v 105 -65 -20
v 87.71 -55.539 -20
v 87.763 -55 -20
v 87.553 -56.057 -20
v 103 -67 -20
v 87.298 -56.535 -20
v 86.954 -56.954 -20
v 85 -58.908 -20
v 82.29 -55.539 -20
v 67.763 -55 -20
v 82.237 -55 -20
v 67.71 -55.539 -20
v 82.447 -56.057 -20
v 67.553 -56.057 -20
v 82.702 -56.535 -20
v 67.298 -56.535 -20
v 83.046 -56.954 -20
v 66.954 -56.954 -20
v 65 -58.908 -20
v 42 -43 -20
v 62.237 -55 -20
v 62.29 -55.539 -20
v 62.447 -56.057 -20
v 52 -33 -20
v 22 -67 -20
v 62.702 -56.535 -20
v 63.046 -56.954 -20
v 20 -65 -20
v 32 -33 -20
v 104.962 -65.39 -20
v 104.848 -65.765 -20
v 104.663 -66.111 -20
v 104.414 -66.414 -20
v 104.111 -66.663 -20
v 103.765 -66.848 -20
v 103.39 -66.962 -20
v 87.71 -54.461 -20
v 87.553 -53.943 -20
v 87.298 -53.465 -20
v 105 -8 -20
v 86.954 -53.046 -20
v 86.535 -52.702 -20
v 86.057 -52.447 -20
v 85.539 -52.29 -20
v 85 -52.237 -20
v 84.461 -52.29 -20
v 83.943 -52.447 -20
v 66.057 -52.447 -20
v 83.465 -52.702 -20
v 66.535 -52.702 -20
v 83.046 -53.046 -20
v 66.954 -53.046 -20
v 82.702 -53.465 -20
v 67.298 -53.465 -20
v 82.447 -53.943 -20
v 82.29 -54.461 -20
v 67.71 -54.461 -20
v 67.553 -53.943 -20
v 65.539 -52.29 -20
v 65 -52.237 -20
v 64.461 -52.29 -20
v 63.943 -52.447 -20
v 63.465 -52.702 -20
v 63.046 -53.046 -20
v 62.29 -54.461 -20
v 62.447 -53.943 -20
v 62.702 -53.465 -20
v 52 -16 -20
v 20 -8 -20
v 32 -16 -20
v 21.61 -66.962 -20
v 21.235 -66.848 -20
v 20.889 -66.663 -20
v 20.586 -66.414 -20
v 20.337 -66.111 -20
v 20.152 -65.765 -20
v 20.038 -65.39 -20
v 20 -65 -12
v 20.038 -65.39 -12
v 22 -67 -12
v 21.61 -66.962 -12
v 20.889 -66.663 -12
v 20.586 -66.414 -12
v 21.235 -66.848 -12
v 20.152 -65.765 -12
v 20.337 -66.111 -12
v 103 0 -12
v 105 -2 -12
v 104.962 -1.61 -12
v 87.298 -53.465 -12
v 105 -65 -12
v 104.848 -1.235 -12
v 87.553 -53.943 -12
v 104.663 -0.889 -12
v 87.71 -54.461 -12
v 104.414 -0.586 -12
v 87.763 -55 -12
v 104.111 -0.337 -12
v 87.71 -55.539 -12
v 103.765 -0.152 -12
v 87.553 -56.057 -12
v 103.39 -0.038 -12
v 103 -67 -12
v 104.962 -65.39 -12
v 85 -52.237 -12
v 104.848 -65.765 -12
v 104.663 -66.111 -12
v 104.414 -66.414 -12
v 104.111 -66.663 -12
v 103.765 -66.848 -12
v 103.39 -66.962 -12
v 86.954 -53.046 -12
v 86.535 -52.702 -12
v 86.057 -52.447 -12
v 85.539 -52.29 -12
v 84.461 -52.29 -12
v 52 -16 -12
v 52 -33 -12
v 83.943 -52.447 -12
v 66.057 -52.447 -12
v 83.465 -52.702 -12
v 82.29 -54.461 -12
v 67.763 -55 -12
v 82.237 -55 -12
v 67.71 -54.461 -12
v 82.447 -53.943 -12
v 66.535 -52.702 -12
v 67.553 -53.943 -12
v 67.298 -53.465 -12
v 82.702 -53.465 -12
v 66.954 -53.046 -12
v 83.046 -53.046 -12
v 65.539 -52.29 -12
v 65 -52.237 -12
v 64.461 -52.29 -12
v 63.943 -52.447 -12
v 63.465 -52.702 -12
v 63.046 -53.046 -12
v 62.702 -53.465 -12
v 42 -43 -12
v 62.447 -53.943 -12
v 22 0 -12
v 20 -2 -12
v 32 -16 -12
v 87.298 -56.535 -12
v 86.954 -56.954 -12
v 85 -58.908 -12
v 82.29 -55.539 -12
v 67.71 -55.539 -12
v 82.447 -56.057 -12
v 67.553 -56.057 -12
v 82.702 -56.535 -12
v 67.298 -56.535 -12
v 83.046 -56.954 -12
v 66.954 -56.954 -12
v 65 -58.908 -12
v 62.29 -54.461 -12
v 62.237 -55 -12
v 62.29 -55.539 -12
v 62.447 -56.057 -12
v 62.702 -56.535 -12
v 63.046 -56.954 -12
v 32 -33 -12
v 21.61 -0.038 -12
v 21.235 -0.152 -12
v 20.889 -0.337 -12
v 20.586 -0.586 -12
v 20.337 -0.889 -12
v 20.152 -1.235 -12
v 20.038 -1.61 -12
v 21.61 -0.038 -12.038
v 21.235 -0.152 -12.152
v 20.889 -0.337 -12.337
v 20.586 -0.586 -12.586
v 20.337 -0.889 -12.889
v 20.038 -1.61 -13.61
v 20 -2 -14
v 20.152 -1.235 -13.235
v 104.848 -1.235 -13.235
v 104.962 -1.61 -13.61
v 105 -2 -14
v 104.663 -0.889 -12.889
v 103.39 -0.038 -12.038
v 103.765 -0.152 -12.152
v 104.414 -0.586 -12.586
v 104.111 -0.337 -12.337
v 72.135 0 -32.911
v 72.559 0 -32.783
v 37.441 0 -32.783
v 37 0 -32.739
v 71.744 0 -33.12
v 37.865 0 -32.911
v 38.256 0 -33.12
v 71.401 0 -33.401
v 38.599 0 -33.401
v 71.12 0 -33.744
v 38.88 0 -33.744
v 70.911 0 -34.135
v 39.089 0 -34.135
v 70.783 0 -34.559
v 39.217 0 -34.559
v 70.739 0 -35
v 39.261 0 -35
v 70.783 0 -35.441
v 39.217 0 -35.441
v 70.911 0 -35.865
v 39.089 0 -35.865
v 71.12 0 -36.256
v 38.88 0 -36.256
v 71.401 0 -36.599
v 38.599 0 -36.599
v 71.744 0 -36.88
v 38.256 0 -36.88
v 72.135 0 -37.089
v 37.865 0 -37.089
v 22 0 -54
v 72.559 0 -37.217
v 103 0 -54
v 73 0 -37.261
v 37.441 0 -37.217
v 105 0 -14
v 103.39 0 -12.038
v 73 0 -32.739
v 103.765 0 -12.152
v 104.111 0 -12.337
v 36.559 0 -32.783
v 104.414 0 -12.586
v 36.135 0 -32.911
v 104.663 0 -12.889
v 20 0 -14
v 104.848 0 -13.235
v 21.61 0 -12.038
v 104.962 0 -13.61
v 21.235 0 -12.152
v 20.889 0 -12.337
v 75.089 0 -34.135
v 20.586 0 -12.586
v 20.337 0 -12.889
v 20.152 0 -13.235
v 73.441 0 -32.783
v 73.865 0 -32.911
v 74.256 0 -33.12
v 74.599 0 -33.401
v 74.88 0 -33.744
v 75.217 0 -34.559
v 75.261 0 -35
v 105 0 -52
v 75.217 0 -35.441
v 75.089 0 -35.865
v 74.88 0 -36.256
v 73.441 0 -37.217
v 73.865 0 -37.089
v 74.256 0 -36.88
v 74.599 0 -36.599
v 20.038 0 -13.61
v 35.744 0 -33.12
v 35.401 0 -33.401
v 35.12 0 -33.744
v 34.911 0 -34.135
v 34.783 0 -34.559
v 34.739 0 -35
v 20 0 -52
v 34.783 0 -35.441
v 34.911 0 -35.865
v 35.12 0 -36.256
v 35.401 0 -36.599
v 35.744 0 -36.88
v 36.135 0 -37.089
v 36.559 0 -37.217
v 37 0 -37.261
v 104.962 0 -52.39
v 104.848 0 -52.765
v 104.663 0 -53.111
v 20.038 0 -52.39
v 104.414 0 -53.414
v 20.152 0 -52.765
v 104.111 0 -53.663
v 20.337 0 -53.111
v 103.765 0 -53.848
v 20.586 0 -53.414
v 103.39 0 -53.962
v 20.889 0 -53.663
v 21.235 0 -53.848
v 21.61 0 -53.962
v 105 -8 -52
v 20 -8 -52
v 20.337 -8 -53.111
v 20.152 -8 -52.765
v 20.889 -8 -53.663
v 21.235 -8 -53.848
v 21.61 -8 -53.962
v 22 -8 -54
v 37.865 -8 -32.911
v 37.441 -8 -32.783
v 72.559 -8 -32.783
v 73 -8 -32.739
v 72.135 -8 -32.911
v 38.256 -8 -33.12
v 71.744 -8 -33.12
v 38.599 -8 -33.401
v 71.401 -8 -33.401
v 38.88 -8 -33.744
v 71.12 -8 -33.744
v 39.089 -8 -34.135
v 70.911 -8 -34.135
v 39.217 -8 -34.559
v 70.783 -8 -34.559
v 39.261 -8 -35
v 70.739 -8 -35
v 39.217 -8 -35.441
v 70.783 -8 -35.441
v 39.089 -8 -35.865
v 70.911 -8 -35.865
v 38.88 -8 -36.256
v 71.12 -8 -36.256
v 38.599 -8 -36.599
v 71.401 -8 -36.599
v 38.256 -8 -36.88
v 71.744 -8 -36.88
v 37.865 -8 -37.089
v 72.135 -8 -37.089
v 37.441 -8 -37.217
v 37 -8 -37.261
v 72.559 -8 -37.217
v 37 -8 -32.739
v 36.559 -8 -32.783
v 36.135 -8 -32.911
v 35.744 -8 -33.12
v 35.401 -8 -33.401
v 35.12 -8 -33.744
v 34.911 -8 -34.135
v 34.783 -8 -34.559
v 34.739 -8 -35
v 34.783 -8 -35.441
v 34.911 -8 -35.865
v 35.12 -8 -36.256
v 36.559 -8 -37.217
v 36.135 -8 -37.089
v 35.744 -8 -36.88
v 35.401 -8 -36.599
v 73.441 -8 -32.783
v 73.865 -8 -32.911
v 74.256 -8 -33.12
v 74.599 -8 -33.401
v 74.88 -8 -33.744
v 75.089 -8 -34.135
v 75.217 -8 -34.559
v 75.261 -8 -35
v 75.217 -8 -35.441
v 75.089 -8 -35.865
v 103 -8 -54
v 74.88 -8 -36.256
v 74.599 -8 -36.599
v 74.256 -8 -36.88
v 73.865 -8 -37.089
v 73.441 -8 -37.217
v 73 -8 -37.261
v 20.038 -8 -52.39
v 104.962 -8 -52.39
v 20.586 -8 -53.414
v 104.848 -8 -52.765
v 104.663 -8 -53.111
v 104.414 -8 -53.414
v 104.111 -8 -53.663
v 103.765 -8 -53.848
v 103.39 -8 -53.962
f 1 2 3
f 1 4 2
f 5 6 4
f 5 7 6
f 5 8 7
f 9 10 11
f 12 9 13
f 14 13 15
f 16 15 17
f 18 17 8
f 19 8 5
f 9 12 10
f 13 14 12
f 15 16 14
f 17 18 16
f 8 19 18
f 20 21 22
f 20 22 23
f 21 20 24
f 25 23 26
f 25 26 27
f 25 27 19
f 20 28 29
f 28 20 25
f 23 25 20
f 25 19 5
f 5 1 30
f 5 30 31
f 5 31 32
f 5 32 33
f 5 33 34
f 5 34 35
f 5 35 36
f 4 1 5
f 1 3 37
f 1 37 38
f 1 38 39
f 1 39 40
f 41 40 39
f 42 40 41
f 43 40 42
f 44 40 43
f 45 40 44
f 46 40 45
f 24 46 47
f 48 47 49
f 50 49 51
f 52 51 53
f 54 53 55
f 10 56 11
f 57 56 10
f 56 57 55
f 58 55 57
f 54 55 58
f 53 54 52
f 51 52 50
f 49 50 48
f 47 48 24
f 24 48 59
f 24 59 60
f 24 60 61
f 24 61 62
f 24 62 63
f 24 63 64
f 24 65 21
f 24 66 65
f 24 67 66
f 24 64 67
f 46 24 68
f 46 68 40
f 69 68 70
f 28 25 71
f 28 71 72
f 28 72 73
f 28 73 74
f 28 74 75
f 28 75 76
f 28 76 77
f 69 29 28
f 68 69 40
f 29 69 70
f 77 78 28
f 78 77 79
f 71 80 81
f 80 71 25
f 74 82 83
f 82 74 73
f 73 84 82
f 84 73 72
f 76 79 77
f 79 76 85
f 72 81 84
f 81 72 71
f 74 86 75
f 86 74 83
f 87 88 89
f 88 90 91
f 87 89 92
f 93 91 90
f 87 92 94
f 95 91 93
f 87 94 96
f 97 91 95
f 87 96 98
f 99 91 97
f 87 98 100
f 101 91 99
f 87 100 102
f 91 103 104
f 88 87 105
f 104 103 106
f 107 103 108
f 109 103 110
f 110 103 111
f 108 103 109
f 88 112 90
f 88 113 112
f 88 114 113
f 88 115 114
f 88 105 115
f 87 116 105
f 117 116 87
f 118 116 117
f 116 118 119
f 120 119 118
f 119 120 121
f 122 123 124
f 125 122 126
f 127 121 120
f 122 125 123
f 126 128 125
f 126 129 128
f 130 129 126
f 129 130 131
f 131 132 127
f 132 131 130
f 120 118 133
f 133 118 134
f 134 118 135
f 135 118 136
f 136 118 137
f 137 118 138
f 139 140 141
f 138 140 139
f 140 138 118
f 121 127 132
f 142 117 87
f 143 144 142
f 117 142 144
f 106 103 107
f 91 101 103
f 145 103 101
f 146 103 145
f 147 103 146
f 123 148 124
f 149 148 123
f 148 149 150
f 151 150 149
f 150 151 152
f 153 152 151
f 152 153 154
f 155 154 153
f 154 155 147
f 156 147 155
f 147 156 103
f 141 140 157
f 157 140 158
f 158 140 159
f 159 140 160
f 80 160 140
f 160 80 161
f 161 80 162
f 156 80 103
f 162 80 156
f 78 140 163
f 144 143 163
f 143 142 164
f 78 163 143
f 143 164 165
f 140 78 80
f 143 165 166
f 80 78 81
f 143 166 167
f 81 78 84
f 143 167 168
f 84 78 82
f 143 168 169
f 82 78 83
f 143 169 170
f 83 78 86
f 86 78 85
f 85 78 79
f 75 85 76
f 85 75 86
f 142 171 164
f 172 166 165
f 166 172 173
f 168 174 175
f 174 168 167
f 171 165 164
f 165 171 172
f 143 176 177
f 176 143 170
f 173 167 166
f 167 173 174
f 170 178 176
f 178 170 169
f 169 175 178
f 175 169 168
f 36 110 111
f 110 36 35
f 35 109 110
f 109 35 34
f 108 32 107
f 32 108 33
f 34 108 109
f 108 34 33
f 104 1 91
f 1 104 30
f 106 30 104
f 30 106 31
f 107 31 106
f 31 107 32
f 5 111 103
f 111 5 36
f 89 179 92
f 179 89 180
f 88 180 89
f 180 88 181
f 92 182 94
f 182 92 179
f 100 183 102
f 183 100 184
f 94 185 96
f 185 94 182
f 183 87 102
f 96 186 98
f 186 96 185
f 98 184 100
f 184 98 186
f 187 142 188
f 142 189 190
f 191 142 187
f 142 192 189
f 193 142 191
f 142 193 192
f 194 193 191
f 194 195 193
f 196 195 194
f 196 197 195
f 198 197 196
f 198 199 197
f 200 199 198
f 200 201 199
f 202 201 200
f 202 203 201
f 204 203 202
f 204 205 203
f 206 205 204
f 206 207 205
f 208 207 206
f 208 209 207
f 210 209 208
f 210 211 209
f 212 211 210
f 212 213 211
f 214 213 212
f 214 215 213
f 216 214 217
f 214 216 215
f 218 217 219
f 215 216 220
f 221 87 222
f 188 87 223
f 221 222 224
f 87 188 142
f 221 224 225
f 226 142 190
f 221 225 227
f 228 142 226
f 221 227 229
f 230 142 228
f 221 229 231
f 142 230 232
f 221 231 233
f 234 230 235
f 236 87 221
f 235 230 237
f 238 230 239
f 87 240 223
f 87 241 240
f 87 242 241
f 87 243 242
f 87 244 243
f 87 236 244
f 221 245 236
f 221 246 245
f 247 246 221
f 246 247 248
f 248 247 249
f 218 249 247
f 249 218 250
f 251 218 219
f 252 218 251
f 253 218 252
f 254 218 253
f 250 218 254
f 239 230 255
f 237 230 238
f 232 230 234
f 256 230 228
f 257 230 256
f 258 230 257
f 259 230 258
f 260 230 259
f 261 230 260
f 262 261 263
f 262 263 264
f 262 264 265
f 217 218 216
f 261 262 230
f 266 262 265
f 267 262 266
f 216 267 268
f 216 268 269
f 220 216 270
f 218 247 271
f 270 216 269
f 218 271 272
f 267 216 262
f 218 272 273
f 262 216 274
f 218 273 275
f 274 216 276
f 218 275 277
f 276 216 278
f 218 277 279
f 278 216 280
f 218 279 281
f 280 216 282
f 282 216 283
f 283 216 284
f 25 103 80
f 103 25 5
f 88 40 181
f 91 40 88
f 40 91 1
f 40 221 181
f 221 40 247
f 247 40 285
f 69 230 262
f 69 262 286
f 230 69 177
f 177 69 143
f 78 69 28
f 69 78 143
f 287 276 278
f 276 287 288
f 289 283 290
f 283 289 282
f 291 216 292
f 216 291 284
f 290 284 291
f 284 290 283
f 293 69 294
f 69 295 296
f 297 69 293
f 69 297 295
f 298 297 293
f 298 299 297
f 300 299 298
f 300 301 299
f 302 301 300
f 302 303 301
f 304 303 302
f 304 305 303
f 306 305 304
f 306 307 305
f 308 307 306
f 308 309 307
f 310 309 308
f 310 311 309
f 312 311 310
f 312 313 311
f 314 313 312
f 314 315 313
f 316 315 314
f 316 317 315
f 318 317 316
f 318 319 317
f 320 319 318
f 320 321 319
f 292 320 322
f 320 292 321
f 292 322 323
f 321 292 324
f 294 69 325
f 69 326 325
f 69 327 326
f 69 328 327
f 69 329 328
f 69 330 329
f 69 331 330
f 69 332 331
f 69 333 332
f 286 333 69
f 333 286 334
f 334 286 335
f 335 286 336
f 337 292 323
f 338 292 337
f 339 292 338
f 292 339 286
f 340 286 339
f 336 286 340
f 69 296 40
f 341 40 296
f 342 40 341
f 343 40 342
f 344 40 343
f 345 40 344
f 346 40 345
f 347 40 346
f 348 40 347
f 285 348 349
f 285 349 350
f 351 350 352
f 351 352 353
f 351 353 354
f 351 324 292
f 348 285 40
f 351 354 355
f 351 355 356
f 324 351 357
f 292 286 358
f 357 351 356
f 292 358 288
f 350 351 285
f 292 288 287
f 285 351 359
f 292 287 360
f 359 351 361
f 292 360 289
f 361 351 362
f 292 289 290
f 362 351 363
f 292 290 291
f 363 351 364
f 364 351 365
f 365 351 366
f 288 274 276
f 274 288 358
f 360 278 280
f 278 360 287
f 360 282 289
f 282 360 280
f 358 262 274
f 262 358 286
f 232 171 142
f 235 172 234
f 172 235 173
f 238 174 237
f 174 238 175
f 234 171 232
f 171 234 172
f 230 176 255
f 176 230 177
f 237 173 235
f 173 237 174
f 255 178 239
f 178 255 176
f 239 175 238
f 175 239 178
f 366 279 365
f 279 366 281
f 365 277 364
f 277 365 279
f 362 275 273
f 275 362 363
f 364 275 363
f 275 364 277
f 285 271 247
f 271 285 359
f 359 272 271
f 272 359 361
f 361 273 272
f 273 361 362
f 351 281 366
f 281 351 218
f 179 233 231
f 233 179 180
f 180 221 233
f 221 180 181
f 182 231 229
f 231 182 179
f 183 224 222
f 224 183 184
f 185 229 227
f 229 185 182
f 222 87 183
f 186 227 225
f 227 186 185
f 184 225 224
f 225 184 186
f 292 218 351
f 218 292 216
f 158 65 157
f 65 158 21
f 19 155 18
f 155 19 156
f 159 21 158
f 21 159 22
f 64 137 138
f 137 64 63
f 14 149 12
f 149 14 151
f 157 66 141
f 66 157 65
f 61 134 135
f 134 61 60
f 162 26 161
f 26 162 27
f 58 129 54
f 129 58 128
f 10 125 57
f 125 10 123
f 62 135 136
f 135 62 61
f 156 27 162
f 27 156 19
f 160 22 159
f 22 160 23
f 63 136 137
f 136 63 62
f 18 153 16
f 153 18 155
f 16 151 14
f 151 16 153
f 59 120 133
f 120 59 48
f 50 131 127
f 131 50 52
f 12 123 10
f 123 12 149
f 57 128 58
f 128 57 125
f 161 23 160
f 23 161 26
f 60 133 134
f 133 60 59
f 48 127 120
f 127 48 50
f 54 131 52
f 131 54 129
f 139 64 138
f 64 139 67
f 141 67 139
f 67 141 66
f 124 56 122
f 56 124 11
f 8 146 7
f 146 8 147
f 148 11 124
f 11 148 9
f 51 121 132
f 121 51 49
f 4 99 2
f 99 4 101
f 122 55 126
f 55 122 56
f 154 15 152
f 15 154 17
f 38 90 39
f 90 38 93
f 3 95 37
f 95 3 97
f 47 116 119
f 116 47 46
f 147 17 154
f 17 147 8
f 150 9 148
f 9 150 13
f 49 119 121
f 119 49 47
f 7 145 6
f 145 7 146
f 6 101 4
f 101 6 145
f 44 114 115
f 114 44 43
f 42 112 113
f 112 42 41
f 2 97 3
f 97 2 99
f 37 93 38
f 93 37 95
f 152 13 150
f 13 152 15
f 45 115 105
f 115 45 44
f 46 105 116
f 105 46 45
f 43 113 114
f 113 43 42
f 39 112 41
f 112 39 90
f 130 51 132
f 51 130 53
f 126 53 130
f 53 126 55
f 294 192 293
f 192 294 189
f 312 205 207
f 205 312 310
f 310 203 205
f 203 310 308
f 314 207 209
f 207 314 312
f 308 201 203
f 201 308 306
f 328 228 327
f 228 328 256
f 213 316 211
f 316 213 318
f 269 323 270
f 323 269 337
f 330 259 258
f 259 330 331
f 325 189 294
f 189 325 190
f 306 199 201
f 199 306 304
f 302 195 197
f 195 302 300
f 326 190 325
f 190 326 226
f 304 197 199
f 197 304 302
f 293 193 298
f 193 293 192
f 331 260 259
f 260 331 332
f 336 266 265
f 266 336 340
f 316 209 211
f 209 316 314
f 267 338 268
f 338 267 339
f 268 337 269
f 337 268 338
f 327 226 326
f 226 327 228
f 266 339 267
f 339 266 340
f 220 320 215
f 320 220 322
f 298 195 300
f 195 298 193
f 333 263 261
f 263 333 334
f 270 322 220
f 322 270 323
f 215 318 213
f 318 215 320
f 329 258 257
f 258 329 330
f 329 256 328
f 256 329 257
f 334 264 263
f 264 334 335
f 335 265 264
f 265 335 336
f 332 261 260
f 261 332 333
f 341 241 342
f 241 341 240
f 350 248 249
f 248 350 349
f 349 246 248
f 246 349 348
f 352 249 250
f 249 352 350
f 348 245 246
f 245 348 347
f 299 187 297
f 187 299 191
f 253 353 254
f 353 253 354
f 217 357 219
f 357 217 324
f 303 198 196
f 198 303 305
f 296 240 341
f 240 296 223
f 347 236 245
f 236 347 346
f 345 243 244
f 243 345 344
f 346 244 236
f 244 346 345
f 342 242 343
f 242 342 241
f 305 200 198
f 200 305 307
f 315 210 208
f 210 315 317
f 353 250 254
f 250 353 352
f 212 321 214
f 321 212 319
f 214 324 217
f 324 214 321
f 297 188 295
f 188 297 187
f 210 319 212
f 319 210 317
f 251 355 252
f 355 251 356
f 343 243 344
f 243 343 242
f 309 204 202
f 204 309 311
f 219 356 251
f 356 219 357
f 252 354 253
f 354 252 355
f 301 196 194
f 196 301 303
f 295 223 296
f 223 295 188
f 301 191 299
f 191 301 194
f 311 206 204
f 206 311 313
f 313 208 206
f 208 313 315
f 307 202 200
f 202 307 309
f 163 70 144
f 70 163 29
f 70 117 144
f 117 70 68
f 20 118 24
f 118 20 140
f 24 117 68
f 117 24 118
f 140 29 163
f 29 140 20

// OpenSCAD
// TD04A support only. Camera has no angle bracket.
wall=8; x0=20; width=85; rear_y=-67; top_z=-12; bottom_z=-54;
td_x=55; td_z=-35; pitch=36;
$fn=48;
module hole(d,h){cylinder(d=d/cos(180/32),h=h,$fn=32);}
difference(){
 union(){
  translate([x0,rear_y,top_z-wall])rb([width,-rear_y,wall],2);
  translate([x0,-wall,bottom_z])rb([width,wall,top_z-bottom_z],2,"y");
 }
 for(x=[65,85])translate([x,-55,top_z-wall-.02])roof(5.5,wall+.04,-90);
 for(x=[td_x-pitch/2,td_x+pitch/2])translate([x,-wall-.02,td_z])rotate([-90,0,0])hole(4.5,wall+.04);
 translate([32,0,top_z-wall-.02])linear_extrude(wall+.04)polygon([[0,-16],[20,-16],[20,-33],[10,-43],[0,-33]]);
}
// Rounded profile extrusions preserve planar mating faces and bed contact.
module rz(s,r){
 assert(r>0 && 2*r<min(s[0],s[1]));
 union(){
  translate([r,0,0])cube([s[0]-2*r,s[1],s[2]]);
  translate([0,r,0])cube([s[0],s[1]-2*r,s[2]]);
  for(x=[r,s[0]-r],y=[r,s[1]-r])translate([x,y,0])cylinder(r=r,h=s[2],$fn=32);
 }
}
module rb(s,r=2,axis="z"){
 if(axis=="z")rz(s,r);
 if(axis=="y")translate([0,s[1],0])rotate([90,0,0])rz([s[0],s[2],s[1]],r);
 if(axis=="x")translate([0,0,s[2]])rotate([0,90,0])rz([s[2],s[1],s[0]],r);
}
// +X peak; rotate in bore plane so peak points upward in the supplied print STL.
module roof(d,h,angle=0){
 r=d/2/cos(180/32);
 rotate([0,0,angle])linear_extrude(height=h)union(){
  circle(r=r,$fn=32);
  polygon([[r/sqrt(2),-r/sqrt(2)],[sqrt(2)*r,0],[r/sqrt(2),r/sqrt(2)]]);
 }
}
